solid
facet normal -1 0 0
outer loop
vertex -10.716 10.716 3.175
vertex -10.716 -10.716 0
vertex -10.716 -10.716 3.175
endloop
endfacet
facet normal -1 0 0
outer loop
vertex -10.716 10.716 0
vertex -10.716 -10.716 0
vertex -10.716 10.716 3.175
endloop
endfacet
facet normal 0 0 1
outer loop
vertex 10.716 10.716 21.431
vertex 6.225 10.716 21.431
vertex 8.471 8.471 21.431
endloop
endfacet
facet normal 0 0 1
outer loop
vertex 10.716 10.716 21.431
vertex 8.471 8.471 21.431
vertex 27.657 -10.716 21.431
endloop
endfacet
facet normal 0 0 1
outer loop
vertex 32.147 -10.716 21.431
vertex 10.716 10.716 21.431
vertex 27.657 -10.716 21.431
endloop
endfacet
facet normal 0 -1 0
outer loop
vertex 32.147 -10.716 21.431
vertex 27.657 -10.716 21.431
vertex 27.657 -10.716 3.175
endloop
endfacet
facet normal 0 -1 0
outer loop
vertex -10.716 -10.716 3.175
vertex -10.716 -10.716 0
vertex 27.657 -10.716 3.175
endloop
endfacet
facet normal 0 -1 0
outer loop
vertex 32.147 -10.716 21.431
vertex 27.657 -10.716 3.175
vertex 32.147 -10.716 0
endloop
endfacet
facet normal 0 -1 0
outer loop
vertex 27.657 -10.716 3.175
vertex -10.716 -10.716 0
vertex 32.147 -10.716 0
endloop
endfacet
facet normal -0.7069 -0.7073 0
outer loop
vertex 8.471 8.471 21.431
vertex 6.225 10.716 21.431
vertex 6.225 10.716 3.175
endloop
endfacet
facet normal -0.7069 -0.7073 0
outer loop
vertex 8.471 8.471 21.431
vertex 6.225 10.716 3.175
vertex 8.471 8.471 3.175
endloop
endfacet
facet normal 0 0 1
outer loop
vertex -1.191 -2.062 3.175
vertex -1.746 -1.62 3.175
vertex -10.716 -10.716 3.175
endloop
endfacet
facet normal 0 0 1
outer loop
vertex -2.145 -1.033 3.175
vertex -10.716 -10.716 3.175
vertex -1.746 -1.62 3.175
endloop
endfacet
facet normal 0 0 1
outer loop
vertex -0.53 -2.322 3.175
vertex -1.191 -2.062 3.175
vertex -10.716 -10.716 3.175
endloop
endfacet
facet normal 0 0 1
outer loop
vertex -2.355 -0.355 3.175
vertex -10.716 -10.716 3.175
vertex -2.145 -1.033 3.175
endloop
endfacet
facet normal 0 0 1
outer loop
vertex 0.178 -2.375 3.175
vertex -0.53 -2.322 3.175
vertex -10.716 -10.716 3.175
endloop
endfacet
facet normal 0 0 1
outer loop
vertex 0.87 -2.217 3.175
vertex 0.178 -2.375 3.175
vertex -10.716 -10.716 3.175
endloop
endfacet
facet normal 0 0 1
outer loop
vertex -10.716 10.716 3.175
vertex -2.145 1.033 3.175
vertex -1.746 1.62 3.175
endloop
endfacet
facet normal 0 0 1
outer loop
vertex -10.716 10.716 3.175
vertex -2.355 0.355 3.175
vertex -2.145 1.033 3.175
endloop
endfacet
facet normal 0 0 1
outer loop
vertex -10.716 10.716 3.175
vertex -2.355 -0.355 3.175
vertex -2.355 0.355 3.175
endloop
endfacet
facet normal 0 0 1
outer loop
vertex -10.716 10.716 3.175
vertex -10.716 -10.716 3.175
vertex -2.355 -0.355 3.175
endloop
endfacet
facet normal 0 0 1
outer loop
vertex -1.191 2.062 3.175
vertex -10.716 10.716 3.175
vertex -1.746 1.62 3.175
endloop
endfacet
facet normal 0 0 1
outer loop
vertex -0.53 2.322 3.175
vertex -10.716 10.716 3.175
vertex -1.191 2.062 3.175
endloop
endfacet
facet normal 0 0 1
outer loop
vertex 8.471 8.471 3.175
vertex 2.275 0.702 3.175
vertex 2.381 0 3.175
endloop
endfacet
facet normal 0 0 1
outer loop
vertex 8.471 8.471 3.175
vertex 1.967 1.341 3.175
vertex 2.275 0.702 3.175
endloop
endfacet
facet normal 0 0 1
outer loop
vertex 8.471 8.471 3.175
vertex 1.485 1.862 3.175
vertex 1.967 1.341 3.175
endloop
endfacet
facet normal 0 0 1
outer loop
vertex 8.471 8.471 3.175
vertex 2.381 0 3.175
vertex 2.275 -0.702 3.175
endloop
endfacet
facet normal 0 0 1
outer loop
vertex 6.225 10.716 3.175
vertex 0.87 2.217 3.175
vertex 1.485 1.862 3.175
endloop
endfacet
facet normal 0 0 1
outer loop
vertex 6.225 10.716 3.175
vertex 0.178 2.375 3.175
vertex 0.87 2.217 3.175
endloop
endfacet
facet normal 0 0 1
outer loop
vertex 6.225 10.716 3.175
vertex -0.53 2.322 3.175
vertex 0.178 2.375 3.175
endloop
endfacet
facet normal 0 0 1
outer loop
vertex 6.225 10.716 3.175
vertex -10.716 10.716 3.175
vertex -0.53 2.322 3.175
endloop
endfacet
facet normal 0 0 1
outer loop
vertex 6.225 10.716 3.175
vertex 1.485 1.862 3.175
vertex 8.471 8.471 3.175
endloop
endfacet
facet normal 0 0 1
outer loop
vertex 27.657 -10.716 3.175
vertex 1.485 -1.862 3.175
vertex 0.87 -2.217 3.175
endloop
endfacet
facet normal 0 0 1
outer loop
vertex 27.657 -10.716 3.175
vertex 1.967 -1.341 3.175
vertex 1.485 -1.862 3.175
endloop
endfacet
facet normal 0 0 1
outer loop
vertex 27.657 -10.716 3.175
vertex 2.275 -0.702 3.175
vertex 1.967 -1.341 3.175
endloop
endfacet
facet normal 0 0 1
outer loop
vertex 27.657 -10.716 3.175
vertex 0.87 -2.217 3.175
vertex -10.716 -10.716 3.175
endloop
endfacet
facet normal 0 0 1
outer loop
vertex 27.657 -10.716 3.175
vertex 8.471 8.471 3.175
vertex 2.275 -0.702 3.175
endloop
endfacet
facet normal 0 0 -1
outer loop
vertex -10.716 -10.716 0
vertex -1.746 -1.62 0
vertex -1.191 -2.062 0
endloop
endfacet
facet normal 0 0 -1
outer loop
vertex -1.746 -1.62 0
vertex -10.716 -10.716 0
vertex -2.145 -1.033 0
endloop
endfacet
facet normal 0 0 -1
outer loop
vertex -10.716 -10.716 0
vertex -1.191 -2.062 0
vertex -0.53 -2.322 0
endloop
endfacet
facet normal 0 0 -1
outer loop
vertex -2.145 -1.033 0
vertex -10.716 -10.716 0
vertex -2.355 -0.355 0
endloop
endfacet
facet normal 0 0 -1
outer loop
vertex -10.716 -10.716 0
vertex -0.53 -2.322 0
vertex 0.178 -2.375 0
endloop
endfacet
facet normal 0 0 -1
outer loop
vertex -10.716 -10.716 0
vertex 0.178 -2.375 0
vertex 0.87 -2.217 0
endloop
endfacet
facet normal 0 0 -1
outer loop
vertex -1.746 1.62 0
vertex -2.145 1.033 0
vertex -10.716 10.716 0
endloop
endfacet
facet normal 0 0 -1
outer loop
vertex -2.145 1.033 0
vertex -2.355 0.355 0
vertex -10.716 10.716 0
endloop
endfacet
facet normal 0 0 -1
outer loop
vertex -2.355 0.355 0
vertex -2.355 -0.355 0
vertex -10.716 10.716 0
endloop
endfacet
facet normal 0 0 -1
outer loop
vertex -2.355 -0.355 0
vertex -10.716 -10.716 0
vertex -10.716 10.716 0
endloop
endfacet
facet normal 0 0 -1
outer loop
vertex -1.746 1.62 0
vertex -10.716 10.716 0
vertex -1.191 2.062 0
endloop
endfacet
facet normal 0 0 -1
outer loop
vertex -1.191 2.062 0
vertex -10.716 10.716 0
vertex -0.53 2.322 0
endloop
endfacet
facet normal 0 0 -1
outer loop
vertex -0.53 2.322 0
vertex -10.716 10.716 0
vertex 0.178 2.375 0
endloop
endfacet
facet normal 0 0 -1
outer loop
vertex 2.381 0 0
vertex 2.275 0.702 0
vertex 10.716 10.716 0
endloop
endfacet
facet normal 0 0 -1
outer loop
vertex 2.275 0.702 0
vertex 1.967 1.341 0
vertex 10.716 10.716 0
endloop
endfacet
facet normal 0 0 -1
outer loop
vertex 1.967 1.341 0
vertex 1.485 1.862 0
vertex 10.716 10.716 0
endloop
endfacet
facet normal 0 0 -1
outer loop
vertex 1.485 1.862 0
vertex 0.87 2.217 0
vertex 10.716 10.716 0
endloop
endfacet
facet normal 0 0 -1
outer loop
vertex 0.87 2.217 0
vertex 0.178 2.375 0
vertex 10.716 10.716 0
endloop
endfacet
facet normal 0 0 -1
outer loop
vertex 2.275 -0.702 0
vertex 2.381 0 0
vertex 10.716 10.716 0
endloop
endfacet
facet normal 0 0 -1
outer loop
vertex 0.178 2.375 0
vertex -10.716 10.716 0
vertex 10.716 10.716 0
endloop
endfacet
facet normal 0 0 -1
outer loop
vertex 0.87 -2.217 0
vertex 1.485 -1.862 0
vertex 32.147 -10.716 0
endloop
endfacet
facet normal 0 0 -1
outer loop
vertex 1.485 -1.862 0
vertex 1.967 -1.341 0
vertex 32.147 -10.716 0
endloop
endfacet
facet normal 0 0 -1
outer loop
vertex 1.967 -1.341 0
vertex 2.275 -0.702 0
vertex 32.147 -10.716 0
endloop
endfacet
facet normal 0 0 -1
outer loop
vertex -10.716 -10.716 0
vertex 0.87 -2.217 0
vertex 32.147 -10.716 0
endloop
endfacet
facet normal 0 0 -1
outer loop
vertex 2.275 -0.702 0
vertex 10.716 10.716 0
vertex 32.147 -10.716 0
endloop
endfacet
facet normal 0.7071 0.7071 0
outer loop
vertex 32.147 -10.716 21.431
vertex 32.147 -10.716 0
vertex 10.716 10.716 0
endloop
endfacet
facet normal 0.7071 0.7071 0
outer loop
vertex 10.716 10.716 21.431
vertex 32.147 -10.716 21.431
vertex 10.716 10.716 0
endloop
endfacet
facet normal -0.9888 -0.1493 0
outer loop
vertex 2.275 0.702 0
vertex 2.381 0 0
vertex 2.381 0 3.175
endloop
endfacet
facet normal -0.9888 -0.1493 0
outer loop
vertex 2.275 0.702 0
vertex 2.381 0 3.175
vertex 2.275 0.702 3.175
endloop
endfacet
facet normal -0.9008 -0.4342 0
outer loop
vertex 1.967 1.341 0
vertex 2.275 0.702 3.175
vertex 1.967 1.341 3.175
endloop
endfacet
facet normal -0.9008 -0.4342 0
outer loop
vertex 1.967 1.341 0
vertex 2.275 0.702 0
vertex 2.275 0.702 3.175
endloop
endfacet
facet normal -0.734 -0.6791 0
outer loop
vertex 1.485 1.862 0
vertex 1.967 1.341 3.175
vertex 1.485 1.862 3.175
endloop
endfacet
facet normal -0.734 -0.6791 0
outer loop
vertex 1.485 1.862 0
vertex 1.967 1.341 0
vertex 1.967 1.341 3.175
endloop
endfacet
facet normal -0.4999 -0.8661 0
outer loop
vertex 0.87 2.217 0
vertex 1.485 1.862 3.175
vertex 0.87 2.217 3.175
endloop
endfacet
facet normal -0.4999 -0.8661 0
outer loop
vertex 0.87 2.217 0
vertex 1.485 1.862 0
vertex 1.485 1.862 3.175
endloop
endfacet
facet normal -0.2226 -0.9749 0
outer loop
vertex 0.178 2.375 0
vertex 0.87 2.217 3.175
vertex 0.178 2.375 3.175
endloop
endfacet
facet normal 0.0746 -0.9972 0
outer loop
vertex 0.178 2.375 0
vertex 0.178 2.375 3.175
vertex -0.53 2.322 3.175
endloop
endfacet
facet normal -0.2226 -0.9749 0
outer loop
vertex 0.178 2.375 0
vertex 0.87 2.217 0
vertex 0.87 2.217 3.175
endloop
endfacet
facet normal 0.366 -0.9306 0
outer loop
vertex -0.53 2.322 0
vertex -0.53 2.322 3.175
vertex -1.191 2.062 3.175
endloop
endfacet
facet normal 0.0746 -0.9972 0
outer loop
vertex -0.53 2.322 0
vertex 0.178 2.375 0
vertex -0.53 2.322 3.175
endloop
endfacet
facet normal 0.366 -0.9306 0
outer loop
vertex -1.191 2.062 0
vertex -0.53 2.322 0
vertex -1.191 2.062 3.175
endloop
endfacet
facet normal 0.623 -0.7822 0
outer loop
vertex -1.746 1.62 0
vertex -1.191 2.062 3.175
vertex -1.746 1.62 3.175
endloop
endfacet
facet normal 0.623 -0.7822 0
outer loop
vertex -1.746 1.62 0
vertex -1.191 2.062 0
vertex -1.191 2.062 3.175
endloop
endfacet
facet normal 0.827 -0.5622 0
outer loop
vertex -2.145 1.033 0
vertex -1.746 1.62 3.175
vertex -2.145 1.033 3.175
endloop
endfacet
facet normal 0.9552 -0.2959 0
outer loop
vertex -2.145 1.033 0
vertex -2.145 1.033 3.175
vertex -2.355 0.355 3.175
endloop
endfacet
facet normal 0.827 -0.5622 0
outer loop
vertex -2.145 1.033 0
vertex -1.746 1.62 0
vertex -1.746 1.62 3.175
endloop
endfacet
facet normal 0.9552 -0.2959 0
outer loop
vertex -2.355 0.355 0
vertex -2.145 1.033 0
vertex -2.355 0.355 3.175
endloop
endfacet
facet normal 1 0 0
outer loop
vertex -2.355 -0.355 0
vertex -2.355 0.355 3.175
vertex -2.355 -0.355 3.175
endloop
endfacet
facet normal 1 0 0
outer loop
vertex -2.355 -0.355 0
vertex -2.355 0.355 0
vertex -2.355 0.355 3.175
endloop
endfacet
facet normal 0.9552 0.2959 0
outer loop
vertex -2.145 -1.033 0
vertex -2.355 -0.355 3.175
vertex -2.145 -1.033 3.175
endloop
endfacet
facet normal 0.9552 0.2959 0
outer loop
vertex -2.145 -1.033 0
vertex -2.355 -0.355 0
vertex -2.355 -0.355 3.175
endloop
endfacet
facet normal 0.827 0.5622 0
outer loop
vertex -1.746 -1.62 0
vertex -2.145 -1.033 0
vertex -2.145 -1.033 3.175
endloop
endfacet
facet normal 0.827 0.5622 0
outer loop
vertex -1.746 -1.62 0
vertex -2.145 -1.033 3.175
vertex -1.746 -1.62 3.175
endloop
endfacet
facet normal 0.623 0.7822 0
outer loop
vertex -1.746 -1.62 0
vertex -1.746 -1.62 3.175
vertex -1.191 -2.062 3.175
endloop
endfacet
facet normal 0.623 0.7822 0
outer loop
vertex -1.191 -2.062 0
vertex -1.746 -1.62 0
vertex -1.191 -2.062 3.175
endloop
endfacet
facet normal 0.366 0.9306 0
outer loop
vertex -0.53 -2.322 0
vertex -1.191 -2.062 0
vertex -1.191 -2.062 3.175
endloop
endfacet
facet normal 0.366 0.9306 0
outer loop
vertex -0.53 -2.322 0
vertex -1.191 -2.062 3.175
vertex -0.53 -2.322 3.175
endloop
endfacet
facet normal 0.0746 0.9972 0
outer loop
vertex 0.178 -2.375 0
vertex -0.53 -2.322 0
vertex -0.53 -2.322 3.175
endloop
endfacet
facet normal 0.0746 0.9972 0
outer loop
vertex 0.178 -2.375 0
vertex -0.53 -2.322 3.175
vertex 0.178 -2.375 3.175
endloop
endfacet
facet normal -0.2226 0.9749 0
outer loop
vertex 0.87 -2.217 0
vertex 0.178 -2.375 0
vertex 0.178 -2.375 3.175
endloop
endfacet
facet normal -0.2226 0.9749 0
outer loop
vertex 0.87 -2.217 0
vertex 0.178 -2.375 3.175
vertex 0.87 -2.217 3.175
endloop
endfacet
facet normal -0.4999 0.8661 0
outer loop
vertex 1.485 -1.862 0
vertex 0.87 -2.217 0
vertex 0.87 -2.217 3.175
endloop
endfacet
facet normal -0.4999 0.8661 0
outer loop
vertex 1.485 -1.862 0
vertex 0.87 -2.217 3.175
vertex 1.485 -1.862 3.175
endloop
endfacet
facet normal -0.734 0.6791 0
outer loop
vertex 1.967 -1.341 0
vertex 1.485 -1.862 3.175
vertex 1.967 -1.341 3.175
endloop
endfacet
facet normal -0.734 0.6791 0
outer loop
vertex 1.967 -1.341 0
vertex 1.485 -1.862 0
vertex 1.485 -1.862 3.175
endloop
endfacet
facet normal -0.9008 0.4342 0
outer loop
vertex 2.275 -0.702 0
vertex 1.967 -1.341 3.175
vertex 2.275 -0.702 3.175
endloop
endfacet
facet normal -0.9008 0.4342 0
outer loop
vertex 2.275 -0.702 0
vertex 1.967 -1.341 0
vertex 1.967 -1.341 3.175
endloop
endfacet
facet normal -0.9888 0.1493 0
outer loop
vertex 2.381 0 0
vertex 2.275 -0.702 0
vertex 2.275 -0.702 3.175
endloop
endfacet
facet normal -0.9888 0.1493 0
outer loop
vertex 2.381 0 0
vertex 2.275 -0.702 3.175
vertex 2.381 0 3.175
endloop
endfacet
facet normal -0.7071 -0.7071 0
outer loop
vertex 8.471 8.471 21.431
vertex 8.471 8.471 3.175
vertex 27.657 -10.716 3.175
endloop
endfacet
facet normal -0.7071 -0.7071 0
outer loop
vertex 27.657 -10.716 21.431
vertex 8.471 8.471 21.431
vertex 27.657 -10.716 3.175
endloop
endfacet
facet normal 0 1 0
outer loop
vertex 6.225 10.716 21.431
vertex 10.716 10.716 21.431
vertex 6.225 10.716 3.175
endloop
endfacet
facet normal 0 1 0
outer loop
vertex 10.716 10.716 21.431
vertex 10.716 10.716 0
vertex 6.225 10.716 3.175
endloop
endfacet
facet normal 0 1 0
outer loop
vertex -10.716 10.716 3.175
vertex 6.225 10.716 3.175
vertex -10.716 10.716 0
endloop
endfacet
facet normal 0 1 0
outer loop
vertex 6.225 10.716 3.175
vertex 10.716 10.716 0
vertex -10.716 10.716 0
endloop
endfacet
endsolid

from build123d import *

# Parameters (mm, degrees)
F0_W     = 21.43125
F0_H     = 21.43125
F0_R     = 2.38125
F1_DEPTH = 3.175
F3_DEPTH = 18.25625


# Not quite as in the source:
# - a length typed as a fraction of an inch, garbled in the dataset ("3 / 203.2 mm" for 3/8 in), is restored


with BuildPart() as f1:
    # F0 (on Top) → F1 (new body)
    with BuildSketch(Plane.XY):
        Rectangle(F0_W, F0_H)
        Circle(F0_R, mode=Mode.SUBTRACT)
        Polygon((32.146875, -10.715625), (10.715625, 10.715625), (10.715625, -10.715625), align=None)
    extrude(amount=F1_DEPTH)

    # F2 (on face) → F3 (join)
    with BuildSketch(Plane.XY.offset(3.175)):
        Polygon((32.146875, -10.715625), (10.715625, 10.715625), (8.4705609697, 8.4705609697), (27.6567469395, -10.715625), align=None)
        Polygon((8.4705609697, 8.4705609697), (10.715625, 10.715625), (6.2254969395, 10.715625), align=None)
    extrude(amount=F3_DEPTH)


solid = f1.part
